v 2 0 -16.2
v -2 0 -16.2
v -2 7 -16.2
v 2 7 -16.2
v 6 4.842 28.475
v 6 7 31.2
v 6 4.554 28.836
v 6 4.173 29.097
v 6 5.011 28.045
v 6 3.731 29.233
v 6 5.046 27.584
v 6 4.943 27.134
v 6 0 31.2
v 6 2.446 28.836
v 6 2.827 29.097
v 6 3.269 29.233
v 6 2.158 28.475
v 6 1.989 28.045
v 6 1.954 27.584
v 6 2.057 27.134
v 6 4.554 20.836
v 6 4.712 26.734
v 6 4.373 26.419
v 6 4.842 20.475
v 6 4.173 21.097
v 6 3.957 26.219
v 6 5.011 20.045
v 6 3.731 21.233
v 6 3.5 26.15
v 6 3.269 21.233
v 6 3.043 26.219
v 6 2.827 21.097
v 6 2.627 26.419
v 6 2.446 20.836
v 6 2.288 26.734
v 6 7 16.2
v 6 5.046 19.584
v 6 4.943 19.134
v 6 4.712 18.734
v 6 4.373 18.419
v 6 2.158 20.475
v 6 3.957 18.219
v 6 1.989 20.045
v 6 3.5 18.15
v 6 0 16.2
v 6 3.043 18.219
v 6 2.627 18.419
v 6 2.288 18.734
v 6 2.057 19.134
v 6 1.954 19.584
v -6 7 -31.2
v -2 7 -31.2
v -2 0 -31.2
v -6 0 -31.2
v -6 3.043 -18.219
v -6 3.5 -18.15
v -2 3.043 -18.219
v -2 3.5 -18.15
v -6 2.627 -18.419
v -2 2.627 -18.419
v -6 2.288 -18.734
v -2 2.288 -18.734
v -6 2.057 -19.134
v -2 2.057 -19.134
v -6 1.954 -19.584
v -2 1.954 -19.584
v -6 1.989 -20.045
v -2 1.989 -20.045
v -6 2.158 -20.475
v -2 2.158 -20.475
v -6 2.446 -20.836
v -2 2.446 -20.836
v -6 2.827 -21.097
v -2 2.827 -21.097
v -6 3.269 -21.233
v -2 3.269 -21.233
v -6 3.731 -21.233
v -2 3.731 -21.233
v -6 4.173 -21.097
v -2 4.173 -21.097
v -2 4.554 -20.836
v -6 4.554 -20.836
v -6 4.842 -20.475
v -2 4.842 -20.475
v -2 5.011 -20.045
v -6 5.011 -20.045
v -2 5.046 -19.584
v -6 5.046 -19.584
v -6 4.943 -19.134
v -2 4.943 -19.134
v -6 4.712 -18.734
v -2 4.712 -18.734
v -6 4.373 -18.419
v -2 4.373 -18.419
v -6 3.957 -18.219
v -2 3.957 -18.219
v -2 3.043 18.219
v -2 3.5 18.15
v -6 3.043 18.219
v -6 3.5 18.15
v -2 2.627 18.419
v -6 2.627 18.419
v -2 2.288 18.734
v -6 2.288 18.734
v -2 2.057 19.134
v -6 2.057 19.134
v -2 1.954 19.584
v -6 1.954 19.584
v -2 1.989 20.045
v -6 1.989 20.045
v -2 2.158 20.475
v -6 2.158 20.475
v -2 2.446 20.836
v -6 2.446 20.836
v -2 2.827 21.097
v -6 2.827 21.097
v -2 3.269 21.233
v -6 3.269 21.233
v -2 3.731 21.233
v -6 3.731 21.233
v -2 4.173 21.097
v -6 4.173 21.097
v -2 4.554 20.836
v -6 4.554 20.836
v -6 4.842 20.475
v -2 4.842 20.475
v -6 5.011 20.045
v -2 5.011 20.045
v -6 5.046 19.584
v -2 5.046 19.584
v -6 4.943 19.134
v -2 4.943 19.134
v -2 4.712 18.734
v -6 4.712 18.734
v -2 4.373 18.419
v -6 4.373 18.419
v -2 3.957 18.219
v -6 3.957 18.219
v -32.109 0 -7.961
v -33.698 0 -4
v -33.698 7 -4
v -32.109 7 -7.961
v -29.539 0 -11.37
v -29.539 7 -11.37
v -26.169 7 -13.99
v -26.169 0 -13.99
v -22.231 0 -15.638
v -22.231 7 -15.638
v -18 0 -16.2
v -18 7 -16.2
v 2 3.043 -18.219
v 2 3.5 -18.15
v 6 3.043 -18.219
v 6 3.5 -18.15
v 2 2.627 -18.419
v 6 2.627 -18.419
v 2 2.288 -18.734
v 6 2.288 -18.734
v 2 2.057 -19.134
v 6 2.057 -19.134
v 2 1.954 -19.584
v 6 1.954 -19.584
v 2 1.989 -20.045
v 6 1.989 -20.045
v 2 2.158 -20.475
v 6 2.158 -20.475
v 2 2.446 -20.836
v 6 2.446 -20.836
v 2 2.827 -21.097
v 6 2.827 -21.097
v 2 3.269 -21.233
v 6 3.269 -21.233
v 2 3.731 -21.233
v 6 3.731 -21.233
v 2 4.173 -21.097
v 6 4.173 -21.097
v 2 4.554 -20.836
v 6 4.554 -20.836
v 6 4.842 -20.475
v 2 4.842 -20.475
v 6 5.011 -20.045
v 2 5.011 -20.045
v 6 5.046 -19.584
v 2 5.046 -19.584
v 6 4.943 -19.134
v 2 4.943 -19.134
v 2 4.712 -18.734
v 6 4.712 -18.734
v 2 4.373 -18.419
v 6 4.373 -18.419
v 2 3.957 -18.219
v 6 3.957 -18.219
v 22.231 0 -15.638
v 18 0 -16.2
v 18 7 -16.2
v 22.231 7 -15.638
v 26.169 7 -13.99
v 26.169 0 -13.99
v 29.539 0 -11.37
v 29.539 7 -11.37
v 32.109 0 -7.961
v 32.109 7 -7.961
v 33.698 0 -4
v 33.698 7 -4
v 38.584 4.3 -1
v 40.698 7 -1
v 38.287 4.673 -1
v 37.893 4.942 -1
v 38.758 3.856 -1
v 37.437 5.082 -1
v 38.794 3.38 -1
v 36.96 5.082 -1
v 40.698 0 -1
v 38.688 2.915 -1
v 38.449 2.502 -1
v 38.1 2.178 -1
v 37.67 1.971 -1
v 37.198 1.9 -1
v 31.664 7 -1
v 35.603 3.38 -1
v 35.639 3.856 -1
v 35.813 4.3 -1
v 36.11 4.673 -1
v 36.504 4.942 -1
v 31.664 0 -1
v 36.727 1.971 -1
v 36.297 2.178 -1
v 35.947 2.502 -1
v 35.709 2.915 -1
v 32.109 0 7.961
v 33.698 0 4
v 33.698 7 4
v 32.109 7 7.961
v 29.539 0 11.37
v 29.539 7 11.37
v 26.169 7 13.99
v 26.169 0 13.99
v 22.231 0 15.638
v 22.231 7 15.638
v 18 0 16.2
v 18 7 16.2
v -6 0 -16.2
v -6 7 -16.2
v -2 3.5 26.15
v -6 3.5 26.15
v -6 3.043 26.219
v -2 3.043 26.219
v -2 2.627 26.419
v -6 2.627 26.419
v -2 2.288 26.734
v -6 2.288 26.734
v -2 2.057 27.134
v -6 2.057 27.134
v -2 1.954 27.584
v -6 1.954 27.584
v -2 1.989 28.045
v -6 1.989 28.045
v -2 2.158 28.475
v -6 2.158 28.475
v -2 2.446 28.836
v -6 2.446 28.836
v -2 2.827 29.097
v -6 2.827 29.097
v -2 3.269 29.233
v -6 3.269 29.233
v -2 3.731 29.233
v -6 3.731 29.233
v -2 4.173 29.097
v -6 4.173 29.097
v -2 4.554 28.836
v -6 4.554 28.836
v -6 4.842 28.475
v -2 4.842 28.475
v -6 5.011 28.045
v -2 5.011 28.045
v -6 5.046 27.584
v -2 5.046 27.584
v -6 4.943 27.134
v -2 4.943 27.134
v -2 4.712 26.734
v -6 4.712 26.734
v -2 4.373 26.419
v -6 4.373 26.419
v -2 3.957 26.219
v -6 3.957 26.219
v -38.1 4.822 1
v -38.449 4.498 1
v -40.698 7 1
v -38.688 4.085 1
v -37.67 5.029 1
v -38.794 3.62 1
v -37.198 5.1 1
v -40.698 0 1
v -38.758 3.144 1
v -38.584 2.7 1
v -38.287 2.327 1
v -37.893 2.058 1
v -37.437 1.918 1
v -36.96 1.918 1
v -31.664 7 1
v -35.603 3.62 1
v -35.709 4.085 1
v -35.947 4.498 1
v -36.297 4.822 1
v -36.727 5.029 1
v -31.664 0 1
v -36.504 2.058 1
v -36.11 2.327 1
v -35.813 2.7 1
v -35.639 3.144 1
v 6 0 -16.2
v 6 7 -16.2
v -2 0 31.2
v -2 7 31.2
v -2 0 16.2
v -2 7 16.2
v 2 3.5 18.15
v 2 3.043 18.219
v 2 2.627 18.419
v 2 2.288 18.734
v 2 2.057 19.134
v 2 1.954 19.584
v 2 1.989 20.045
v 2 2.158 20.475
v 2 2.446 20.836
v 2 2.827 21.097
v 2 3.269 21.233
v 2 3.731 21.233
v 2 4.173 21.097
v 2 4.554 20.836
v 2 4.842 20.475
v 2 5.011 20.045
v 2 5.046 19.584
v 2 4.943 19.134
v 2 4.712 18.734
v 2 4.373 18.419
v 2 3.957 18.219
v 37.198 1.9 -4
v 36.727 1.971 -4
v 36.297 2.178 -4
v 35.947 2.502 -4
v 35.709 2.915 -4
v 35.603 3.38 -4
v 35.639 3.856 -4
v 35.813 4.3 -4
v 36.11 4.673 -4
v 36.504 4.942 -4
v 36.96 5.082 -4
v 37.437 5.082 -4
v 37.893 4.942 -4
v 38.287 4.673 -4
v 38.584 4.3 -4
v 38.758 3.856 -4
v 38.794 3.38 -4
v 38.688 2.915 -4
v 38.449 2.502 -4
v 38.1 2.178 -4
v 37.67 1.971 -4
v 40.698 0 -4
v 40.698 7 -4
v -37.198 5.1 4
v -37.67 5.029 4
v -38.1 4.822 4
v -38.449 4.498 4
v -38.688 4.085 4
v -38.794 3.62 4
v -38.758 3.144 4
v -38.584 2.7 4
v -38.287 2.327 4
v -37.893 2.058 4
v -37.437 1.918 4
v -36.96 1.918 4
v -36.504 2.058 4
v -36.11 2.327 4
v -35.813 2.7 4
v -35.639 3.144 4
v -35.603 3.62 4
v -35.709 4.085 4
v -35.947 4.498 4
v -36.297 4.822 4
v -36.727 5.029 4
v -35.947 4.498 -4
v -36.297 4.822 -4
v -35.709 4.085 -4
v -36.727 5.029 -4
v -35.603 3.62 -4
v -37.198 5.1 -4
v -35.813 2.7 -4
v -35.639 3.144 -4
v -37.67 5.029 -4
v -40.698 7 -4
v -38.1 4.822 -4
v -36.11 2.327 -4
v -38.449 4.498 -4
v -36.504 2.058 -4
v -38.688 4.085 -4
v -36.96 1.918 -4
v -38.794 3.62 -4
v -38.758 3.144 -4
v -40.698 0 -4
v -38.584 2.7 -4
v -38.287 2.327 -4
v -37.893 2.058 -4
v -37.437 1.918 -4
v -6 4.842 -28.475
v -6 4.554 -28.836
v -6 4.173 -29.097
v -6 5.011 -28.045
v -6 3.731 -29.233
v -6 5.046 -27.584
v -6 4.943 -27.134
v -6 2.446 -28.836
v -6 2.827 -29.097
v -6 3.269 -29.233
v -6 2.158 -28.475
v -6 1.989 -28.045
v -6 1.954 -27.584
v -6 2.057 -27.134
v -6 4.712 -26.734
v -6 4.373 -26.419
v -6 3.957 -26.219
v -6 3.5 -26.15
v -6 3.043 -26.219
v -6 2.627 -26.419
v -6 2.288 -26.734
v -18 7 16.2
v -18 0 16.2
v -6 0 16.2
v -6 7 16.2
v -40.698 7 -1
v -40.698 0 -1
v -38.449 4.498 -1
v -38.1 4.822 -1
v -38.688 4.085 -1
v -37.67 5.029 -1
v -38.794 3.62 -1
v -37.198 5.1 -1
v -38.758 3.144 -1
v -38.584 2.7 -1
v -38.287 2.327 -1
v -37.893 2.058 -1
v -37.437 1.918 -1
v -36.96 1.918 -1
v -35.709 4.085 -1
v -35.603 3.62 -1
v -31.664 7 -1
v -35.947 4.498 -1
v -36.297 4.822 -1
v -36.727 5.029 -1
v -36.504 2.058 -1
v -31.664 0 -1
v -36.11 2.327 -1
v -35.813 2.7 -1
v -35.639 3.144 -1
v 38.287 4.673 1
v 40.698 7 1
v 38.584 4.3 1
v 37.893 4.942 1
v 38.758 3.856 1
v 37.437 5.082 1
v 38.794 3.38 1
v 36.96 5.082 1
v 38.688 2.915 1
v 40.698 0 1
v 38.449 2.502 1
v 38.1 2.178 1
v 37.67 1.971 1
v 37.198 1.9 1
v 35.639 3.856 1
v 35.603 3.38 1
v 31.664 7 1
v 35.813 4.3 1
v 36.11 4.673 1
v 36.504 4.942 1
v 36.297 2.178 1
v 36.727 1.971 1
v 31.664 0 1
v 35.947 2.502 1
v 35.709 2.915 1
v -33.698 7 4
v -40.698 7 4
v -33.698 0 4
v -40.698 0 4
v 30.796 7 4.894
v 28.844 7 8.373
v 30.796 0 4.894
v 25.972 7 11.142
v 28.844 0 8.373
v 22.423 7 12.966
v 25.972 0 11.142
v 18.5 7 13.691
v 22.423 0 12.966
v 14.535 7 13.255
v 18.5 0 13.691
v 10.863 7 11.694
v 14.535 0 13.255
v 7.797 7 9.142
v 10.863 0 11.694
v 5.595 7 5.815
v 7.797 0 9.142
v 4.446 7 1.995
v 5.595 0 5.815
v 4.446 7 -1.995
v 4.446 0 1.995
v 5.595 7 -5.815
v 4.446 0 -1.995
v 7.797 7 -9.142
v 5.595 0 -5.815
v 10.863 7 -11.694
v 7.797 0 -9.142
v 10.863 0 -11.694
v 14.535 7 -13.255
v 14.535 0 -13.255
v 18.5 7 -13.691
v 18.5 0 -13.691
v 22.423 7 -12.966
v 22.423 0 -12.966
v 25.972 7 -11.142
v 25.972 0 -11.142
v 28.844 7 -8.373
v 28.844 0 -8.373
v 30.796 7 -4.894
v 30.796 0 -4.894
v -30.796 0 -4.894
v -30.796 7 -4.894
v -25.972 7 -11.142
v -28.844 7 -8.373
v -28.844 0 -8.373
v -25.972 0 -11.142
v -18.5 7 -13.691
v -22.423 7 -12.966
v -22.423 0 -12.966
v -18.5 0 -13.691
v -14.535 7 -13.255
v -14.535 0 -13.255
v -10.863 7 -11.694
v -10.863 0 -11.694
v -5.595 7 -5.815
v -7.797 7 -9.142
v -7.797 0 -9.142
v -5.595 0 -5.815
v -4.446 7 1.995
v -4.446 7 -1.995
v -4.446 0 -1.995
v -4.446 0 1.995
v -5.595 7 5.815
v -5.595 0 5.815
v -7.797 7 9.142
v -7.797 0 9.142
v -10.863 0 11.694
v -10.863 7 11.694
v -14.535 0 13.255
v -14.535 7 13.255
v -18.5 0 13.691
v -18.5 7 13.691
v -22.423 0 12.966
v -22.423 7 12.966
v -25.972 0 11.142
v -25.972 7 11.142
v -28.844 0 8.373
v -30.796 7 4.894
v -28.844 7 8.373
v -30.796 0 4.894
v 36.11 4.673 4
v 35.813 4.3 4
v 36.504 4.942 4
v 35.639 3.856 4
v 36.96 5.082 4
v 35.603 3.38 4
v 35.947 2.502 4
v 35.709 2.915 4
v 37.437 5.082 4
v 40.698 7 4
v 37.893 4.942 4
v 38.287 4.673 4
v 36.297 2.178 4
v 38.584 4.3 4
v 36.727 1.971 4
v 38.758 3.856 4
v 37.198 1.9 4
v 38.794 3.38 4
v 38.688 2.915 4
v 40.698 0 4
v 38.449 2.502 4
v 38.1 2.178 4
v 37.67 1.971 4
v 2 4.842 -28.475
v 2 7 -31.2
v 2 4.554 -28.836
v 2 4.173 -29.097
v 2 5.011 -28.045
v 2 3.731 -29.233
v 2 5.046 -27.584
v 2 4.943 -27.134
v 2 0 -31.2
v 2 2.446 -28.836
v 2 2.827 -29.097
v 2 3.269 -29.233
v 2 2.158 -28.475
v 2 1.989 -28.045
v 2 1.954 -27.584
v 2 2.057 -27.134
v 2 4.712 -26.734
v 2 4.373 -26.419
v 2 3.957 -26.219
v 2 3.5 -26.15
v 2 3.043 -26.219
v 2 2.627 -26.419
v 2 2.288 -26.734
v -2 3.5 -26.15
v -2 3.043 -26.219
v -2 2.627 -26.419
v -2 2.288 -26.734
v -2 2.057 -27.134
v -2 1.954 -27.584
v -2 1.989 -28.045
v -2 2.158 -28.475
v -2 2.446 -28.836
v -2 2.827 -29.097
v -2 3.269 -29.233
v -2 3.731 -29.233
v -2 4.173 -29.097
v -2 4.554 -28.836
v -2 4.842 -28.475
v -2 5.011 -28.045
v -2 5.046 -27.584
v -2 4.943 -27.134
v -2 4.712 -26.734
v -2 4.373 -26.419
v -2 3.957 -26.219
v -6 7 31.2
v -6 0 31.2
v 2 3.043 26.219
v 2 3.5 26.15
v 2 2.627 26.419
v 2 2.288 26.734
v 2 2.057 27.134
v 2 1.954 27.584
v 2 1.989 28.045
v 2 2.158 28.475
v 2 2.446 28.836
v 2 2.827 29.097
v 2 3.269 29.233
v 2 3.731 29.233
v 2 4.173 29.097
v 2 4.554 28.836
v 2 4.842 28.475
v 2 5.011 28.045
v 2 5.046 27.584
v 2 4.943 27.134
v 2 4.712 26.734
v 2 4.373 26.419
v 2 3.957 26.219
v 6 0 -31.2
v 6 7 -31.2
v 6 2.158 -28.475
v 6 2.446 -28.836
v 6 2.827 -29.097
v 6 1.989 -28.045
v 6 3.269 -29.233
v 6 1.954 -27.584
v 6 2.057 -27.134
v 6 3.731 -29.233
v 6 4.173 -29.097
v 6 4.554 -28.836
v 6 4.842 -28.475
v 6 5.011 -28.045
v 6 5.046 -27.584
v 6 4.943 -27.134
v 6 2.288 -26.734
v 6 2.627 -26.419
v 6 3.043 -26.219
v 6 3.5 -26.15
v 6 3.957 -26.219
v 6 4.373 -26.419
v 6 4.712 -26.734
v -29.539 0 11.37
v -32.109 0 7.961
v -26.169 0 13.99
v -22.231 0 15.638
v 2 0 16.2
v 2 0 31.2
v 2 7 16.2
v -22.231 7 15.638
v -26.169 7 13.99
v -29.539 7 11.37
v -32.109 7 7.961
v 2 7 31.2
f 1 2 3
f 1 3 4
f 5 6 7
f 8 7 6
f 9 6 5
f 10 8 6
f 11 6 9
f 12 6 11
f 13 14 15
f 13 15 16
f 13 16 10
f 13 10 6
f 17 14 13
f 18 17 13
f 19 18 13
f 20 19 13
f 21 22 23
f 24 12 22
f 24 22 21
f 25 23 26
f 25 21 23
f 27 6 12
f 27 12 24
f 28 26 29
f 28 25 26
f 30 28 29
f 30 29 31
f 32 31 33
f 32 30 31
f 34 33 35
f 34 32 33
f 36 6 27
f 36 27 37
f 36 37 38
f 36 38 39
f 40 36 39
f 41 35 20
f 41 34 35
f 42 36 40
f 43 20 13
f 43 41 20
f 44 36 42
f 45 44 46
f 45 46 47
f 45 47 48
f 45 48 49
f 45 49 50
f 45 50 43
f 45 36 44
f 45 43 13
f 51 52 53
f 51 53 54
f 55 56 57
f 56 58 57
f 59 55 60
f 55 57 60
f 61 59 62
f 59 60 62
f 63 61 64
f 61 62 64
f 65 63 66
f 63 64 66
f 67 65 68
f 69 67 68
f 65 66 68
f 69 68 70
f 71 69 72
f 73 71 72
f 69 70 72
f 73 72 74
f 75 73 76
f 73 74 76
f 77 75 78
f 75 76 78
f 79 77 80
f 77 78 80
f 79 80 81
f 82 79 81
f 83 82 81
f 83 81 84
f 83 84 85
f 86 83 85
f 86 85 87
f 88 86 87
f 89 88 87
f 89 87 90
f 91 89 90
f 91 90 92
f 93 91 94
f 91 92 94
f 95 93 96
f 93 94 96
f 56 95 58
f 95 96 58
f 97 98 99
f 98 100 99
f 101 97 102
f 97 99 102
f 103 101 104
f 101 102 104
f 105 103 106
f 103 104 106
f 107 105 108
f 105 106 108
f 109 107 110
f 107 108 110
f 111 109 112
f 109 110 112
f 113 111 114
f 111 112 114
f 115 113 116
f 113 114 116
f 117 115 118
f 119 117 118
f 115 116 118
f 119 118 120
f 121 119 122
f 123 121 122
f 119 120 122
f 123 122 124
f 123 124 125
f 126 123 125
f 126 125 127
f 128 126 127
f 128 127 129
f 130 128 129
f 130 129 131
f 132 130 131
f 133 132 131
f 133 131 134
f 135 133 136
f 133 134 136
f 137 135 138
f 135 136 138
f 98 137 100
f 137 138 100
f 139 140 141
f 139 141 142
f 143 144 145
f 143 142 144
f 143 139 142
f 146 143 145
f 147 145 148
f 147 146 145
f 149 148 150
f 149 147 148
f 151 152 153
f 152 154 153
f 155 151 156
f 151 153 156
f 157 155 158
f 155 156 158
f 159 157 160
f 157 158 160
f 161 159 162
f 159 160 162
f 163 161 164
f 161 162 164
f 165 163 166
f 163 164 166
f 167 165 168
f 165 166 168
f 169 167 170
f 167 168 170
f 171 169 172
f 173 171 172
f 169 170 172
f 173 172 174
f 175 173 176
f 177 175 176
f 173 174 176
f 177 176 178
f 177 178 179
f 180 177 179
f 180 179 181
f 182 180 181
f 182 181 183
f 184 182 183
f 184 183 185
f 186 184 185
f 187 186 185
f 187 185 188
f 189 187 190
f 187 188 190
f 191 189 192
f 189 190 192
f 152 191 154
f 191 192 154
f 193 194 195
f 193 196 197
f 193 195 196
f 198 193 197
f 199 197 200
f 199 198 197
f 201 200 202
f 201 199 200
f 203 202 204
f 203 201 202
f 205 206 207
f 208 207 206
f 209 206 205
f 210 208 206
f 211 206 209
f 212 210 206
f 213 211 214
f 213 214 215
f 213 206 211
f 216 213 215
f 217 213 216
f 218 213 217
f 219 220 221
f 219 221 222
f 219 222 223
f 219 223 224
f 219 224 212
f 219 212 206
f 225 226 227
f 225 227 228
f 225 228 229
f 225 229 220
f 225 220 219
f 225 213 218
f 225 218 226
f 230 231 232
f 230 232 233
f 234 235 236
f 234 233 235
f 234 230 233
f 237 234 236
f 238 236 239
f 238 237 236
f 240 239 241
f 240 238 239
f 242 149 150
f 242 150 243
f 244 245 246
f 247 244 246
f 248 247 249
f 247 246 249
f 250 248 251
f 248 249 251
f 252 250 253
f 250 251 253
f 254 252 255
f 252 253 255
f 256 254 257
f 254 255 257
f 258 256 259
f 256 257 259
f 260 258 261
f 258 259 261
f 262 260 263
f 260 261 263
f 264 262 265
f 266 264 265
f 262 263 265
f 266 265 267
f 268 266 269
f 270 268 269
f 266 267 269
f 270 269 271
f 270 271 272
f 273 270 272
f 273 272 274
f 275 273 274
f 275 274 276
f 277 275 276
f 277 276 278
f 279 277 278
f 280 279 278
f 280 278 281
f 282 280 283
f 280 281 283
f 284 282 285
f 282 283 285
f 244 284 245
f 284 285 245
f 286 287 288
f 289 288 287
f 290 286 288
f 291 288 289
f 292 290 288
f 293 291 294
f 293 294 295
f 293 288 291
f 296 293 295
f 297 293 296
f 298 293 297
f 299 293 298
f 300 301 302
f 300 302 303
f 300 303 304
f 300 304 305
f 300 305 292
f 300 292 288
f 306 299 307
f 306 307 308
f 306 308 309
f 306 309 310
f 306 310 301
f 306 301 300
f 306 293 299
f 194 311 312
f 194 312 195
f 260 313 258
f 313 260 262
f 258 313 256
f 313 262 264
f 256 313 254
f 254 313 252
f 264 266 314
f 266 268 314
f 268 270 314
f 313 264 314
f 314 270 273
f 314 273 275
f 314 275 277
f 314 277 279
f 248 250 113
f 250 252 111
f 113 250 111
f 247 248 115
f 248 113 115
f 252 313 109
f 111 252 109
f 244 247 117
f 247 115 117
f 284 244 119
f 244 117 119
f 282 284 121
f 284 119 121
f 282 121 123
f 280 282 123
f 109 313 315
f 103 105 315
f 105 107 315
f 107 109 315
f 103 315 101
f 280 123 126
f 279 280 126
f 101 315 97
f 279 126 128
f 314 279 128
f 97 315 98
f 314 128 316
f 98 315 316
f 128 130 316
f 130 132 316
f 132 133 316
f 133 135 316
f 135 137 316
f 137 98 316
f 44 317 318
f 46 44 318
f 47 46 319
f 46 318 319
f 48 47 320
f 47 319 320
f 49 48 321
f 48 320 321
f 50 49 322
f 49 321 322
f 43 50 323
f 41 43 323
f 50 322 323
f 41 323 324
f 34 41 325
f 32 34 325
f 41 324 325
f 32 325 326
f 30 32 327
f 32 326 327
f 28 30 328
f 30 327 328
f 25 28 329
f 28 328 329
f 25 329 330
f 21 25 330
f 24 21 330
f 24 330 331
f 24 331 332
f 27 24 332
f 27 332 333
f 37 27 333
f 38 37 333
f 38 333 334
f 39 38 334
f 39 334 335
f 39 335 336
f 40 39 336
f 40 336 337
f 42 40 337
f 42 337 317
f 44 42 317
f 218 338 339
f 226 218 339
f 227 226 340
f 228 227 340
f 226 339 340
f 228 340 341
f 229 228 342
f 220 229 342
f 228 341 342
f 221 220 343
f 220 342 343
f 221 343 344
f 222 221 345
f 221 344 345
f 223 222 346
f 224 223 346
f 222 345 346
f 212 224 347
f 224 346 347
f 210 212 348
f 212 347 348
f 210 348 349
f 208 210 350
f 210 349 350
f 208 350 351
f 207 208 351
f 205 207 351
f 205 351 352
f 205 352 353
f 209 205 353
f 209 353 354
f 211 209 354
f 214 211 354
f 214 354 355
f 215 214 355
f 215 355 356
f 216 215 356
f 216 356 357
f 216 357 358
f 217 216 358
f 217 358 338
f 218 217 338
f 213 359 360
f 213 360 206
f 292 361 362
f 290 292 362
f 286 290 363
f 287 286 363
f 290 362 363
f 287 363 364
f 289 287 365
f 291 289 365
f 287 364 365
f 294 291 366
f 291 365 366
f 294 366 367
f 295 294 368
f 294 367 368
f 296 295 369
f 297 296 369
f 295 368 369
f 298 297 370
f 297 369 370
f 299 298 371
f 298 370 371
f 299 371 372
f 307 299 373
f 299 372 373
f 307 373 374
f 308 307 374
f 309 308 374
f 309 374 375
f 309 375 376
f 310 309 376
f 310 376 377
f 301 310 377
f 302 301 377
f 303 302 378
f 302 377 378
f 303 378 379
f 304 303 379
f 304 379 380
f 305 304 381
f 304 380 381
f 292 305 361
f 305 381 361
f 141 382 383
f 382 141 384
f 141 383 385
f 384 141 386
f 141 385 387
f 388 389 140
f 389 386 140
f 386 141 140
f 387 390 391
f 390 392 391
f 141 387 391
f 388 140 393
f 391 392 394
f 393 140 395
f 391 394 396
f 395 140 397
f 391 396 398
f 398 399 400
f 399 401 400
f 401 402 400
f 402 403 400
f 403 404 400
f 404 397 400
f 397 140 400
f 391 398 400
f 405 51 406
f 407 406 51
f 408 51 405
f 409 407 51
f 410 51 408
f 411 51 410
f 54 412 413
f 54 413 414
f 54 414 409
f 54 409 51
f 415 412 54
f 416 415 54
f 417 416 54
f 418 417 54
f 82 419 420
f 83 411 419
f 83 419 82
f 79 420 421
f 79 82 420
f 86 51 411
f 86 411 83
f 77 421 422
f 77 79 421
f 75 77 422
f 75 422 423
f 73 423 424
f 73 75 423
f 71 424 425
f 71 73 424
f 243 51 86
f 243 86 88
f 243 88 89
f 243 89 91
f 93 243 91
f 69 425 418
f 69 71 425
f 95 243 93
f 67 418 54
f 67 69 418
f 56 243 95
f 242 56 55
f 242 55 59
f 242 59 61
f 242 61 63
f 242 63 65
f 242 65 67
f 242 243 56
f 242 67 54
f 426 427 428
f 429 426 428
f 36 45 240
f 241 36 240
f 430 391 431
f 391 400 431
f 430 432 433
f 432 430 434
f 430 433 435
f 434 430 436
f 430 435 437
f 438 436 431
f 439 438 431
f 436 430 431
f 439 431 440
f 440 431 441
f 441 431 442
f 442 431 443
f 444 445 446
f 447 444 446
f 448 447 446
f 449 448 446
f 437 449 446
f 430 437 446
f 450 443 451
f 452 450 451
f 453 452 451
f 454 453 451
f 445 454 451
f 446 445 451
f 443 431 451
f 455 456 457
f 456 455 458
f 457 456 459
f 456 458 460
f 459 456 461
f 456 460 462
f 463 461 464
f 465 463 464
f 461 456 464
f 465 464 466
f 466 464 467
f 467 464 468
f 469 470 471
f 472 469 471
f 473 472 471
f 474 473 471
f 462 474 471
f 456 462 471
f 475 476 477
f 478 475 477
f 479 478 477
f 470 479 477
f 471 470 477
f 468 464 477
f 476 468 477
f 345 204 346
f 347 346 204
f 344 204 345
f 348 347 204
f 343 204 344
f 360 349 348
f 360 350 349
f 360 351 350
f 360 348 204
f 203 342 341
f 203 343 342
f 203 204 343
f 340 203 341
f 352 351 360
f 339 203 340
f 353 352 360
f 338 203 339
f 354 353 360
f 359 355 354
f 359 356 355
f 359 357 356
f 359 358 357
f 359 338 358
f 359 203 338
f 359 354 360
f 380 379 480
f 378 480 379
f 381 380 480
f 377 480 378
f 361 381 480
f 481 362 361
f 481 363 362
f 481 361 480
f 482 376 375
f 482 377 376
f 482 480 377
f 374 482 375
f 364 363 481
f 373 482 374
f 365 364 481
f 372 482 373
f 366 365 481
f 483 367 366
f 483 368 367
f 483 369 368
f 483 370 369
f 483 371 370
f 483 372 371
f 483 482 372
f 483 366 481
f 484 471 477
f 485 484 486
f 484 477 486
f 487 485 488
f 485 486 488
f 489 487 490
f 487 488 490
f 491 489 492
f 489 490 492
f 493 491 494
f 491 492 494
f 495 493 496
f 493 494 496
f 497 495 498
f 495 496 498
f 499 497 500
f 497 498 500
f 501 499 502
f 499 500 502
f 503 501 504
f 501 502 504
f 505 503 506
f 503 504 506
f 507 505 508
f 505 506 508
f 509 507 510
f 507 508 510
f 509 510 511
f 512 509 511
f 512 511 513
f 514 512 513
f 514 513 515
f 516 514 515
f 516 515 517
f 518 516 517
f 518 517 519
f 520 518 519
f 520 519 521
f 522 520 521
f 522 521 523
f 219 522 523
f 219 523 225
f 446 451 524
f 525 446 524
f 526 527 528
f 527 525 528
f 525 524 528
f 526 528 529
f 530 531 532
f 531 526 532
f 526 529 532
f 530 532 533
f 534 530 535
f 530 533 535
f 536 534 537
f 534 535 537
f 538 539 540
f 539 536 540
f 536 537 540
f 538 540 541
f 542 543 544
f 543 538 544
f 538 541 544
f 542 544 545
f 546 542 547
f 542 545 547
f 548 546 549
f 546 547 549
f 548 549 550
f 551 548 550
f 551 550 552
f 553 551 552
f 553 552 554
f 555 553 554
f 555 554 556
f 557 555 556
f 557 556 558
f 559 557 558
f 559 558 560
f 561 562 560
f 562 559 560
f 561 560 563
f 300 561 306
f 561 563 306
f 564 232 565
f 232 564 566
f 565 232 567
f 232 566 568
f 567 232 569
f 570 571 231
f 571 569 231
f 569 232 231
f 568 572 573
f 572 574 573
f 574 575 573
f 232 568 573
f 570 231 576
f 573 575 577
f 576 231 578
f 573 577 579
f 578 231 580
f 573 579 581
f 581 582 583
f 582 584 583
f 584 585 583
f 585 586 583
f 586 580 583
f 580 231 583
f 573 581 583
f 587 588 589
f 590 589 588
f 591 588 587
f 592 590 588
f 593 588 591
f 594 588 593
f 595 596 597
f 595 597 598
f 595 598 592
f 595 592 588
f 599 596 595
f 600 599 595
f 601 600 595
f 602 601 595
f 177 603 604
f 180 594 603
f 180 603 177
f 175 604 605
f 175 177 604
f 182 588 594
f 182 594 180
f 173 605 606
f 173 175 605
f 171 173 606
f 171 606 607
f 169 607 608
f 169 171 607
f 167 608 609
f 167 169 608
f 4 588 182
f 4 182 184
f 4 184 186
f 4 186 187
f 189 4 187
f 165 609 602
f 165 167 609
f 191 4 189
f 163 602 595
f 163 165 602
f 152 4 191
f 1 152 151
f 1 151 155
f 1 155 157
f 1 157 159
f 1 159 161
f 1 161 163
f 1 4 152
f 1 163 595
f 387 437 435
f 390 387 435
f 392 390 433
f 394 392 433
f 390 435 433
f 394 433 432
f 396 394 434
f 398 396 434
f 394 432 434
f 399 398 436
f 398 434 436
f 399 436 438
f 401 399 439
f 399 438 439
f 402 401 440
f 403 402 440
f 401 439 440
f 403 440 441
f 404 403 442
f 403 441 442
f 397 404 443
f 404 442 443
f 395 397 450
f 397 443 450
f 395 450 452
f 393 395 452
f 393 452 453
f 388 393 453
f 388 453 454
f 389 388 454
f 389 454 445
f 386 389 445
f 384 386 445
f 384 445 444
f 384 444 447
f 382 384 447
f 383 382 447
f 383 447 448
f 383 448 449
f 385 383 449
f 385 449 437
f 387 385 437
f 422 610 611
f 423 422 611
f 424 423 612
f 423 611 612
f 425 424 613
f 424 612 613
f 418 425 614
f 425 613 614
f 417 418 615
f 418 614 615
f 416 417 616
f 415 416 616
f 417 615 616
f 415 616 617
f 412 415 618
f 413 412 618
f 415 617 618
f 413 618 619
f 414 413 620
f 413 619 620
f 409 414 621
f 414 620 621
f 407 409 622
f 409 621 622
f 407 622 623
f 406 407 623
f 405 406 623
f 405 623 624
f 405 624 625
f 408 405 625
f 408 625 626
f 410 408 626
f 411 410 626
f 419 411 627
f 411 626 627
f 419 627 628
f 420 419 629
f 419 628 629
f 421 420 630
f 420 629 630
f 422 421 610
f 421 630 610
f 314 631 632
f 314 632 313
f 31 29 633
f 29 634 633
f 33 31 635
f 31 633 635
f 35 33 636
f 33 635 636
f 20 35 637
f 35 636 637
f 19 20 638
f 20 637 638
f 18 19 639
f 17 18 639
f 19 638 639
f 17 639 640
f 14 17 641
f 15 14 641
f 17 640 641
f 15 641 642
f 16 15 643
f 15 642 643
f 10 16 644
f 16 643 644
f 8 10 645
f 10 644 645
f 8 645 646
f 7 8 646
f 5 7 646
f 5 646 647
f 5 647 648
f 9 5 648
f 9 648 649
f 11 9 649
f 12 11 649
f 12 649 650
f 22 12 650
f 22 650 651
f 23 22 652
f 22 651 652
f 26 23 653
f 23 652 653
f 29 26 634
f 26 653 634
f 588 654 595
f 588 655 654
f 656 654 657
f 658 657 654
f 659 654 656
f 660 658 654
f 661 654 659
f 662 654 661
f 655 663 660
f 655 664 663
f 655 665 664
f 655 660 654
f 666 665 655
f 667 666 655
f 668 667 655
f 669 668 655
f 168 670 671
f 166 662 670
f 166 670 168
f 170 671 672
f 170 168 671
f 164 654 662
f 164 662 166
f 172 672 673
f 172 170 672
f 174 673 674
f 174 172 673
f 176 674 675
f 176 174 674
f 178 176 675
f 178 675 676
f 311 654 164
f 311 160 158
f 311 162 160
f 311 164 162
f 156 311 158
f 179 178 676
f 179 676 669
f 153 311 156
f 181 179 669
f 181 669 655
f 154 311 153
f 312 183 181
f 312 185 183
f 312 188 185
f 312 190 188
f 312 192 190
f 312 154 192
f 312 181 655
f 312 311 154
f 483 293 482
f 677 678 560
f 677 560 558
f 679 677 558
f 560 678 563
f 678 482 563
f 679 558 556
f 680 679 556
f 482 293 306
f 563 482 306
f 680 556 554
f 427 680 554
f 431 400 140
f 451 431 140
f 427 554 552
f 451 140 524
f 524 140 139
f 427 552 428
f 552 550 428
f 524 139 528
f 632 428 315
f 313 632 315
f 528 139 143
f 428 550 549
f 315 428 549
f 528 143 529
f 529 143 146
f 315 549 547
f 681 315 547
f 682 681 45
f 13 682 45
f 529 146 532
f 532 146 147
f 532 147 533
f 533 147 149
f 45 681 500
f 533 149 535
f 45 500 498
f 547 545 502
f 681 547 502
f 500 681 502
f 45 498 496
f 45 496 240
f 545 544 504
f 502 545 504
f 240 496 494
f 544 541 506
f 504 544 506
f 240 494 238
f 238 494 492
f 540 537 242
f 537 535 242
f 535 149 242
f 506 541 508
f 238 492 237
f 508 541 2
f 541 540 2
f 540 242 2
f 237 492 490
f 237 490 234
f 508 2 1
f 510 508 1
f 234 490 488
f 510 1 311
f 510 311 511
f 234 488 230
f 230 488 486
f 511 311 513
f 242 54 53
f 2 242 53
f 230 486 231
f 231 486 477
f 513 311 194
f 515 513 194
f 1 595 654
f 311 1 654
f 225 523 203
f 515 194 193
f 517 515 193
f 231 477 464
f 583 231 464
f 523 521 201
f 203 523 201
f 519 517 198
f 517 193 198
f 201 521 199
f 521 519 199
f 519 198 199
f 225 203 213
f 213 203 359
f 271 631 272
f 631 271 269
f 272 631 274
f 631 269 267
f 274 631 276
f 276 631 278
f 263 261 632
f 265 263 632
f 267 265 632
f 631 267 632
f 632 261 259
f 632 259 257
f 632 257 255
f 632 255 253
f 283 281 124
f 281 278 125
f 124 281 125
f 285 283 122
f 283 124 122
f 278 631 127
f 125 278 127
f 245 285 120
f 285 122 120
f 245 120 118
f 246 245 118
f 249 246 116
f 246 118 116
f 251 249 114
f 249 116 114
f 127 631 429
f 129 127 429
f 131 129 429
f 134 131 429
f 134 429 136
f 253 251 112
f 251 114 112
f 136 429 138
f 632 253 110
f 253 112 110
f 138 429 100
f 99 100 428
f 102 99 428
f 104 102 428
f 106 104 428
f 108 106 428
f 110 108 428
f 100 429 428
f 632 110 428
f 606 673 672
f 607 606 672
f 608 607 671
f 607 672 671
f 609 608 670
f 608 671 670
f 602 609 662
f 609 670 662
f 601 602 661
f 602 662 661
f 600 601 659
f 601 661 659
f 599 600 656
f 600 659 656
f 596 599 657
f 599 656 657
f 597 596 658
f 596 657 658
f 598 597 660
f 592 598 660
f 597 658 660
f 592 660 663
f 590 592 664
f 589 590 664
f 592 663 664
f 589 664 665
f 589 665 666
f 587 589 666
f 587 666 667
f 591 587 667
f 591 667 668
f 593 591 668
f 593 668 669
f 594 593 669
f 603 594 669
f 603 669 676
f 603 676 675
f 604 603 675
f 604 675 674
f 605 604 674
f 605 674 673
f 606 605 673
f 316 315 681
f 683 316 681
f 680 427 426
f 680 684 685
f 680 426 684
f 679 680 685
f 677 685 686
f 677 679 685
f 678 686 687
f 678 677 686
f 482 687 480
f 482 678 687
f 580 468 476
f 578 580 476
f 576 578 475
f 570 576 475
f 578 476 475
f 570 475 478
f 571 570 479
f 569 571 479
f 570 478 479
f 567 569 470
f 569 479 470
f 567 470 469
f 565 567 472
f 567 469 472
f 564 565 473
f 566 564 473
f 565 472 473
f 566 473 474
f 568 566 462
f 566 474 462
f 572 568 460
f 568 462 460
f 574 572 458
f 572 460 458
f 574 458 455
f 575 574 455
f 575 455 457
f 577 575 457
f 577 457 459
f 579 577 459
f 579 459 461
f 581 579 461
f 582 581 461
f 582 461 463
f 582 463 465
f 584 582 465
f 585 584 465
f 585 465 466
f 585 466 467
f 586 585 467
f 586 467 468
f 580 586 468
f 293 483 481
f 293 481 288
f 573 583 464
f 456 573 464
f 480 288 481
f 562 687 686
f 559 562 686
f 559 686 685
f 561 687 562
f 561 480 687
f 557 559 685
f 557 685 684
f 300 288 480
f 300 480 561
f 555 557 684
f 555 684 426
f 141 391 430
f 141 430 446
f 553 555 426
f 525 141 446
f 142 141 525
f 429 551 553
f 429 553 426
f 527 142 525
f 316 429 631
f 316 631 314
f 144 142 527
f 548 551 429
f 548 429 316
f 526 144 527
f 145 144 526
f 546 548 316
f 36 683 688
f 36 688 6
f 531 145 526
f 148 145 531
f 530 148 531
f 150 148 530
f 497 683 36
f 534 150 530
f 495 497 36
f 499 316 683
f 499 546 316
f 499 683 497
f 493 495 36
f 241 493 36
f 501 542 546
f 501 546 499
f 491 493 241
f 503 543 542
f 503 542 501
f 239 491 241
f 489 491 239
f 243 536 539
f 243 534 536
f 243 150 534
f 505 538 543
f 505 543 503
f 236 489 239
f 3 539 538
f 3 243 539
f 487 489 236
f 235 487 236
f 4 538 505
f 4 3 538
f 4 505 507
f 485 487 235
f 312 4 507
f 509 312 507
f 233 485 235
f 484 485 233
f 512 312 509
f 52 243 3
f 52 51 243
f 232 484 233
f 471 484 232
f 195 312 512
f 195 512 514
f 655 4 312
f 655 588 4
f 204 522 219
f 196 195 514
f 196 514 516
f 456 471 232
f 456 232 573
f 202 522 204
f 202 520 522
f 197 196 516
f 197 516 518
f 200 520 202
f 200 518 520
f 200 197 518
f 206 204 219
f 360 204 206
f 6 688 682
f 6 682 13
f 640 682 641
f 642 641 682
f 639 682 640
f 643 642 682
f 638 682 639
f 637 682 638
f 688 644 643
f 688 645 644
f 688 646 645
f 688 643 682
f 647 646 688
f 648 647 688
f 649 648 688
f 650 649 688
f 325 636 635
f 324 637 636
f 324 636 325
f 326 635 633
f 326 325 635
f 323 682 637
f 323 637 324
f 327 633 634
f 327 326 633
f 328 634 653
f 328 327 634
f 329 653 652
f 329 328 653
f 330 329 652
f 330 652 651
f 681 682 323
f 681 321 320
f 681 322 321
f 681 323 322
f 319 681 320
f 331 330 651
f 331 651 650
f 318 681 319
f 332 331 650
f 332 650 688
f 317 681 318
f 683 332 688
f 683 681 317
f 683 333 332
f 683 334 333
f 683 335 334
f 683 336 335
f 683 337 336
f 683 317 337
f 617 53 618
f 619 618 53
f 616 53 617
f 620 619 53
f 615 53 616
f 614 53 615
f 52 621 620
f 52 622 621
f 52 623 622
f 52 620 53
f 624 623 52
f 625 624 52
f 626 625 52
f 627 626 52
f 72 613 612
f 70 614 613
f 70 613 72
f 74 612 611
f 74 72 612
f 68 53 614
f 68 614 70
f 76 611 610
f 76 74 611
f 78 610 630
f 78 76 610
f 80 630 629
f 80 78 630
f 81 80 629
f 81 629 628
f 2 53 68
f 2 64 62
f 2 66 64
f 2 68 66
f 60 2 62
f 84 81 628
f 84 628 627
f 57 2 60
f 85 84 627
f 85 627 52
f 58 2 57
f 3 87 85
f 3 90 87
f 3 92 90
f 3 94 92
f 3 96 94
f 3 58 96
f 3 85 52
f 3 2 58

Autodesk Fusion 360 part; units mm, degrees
sketch "Sketch1" plane through (0, 0, 0) normal (0, 1, 0) x (1, 0, 0)
  line L0 (1.75, 0) -> (22.5, 0)
  arc A0 (-33.6984, -4) -> (-33.6984, 4) centre (-18, 0) ccw
  arc A1 (-31.6635, -1) -> (-31.6635, 1) centre (-18, 0) ccw
  line L1 (-33.6984, 4) -> (-40.6984, 4)
  line L2 (-40.6984, 4) -> (-40.6984, 1)
  line L3 (-40.6984, 1) -> (-31.6635, 1)
  line L4 (-33.6984, -4) -> (-40.6984, -4)
  line L5 (-40.6984, -4) -> (-40.6984, -1)
  line L6 (-40.6984, -1) -> (-31.6635, -1)
  line L7 (-18, 0) -> (-40.6984, 0) construction
  circle A2 centre (-18, 0) radius 12.9205 construction
  line L8 (0, -16.2) -> (0, 16.2)
  line L9 (0, 16.2) -> (-18, 16.2)
  line L10 (0, -16.2) -> (-18, -16.2)
  line L11 (0, 16.2) -> (18, 16.2)
  line L12 (33.6984, -4) -> (40.6984, -4)
  arc A3 (31.6635, 1) -> (31.6635, -1) centre (18, 0) ccw
  circle A4 centre (18, 0) radius 12.9205 construction
  line L13 (40.6984, -4) -> (40.6984, -1)
  line L14 (40.6984, -1) -> (31.6635, -1)
  line L15 (40.6984, 4) -> (40.6984, 1)
  line L16 (18, 0) -> (40.6984, 0) construction
  line L17 (40.6984, 1) -> (31.6635, 1)
  line L18 (0, -16.2) -> (18, -16.2)
  line L19 (33.6984, 4) -> (40.6984, 4)
  line L20 (0, -16.2) -> (0, 16.2)
  arc A5 (33.6984, 4) -> (33.6984, -4) centre (18, 0) ccw
  point P0 (-1.75, 0)
  dimension "d2" = 18
  dimension "d16" = 7
  dimension "d17" = 3
  dimension "d18" = 7
  dimension "d19" = 3
  dimension "d20" = 25.841
  dimension "d21" = 32.4
  dimension "d22" = 13.7
  dimension "d23" = 16.2
extrude "Extrude1" add sketch "Sketch1" along normal blind 7
hole "Hole1" at (-37.1984, 3.5, -4) direction (0, 0, 1) diameter 3.2 depth 8 tip angle 180
hole "Hole2" at (37.1984, 3.5, 4) direction (0, 0, -1) diameter 3.2 depth 8 tip angle 180
sketch "Sketch3" plane through (0, 0, 16.2) normal (0, 0, 1) x (1, 0, 0)
  line L0 (-18, 0) -> (18, 0)
  line L1 (18, 0) -> (18, 7)
  line L2 (18, 7) -> (-18, 7)
  line L3 (-18, 7) -> (-18, 0)
  line L4 (0, 0) -> (0, 7) construction
  line L5 (-2, 7) -> (-6, 7)
  line L6 (-6, 7) -> (-6, 0)
  line L7 (-6, 0) -> (-2, 0)
  line L8 (-2, 0) -> (-2, 7)
  line L9 (2, 7) -> (6, 7)
  line L10 (6, 7) -> (6, 0)
  line L11 (6, 0) -> (2, 0)
  line L12 (2, 0) -> (2, 7)
  dimension "d35" = 4
  dimension "d36" = 7
  dimension "d37" = 2
  dimension "d38" = 4
  dimension "d39" = 7
  dimension "d40" = 2
sketch "Sketch4" plane through (0, 0, -16.2) normal (0, 0, -1) x (-1, 0, 0)
  line L0 (-18, 0) -> (18, 0)
  line L1 (18, 0) -> (18, 7)
  line L2 (18, 7) -> (-18, 7)
  line L3 (-18, 7) -> (-18, 0)
  line L4 (0, 0) -> (0, 7) construction
  line L5 (-6, 7) -> (-2, 7)
  line L6 (-2, 7) -> (-2, 0)
  line L7 (-2, 0) -> (-6, 0)
  line L8 (-6, 0) -> (-6, 7)
  line L9 (2, 7) -> (6, 7)
  line L10 (6, 7) -> (6, 0)
  line L11 (6, 0) -> (2, 0)
  line L12 (2, 0) -> (2, 7)
  dimension "d41" = 2
  dimension "d42" = 2
  dimension "d43" = 4
  dimension "d44" = 4
extrude "Extrude2" add sketch "Sketch4" along normal blind 15 contours L0 L2 L5 L6 L7 L8 | L0 L2 L9 L10 L11 L12
extrude "Extrude3" add sketch "Sketch3" along normal blind 15 contours L0 L2 L5 L6 L7 L8 | L0 L2 L9 L10 L11 L12
hole "Hole3" at (-6, 3.5, -27.7) direction (1, 0, 0) diameter 3.1 depth 12 tip angle 180
hole "Hole4" at (-6, 3.5, -19.7) direction (1, 0, 0) diameter 3.1 depth 12 tip angle 180
hole "Hole5" at (6, 3.5, 27.7) direction (-1, 0, 0) diameter 3.1 depth 12 tip angle 180
hole "Hole6" at (6, 3.5, 19.7) direction (-1, 0, 0) diameter 3.1 depth 12 tip angle 180
